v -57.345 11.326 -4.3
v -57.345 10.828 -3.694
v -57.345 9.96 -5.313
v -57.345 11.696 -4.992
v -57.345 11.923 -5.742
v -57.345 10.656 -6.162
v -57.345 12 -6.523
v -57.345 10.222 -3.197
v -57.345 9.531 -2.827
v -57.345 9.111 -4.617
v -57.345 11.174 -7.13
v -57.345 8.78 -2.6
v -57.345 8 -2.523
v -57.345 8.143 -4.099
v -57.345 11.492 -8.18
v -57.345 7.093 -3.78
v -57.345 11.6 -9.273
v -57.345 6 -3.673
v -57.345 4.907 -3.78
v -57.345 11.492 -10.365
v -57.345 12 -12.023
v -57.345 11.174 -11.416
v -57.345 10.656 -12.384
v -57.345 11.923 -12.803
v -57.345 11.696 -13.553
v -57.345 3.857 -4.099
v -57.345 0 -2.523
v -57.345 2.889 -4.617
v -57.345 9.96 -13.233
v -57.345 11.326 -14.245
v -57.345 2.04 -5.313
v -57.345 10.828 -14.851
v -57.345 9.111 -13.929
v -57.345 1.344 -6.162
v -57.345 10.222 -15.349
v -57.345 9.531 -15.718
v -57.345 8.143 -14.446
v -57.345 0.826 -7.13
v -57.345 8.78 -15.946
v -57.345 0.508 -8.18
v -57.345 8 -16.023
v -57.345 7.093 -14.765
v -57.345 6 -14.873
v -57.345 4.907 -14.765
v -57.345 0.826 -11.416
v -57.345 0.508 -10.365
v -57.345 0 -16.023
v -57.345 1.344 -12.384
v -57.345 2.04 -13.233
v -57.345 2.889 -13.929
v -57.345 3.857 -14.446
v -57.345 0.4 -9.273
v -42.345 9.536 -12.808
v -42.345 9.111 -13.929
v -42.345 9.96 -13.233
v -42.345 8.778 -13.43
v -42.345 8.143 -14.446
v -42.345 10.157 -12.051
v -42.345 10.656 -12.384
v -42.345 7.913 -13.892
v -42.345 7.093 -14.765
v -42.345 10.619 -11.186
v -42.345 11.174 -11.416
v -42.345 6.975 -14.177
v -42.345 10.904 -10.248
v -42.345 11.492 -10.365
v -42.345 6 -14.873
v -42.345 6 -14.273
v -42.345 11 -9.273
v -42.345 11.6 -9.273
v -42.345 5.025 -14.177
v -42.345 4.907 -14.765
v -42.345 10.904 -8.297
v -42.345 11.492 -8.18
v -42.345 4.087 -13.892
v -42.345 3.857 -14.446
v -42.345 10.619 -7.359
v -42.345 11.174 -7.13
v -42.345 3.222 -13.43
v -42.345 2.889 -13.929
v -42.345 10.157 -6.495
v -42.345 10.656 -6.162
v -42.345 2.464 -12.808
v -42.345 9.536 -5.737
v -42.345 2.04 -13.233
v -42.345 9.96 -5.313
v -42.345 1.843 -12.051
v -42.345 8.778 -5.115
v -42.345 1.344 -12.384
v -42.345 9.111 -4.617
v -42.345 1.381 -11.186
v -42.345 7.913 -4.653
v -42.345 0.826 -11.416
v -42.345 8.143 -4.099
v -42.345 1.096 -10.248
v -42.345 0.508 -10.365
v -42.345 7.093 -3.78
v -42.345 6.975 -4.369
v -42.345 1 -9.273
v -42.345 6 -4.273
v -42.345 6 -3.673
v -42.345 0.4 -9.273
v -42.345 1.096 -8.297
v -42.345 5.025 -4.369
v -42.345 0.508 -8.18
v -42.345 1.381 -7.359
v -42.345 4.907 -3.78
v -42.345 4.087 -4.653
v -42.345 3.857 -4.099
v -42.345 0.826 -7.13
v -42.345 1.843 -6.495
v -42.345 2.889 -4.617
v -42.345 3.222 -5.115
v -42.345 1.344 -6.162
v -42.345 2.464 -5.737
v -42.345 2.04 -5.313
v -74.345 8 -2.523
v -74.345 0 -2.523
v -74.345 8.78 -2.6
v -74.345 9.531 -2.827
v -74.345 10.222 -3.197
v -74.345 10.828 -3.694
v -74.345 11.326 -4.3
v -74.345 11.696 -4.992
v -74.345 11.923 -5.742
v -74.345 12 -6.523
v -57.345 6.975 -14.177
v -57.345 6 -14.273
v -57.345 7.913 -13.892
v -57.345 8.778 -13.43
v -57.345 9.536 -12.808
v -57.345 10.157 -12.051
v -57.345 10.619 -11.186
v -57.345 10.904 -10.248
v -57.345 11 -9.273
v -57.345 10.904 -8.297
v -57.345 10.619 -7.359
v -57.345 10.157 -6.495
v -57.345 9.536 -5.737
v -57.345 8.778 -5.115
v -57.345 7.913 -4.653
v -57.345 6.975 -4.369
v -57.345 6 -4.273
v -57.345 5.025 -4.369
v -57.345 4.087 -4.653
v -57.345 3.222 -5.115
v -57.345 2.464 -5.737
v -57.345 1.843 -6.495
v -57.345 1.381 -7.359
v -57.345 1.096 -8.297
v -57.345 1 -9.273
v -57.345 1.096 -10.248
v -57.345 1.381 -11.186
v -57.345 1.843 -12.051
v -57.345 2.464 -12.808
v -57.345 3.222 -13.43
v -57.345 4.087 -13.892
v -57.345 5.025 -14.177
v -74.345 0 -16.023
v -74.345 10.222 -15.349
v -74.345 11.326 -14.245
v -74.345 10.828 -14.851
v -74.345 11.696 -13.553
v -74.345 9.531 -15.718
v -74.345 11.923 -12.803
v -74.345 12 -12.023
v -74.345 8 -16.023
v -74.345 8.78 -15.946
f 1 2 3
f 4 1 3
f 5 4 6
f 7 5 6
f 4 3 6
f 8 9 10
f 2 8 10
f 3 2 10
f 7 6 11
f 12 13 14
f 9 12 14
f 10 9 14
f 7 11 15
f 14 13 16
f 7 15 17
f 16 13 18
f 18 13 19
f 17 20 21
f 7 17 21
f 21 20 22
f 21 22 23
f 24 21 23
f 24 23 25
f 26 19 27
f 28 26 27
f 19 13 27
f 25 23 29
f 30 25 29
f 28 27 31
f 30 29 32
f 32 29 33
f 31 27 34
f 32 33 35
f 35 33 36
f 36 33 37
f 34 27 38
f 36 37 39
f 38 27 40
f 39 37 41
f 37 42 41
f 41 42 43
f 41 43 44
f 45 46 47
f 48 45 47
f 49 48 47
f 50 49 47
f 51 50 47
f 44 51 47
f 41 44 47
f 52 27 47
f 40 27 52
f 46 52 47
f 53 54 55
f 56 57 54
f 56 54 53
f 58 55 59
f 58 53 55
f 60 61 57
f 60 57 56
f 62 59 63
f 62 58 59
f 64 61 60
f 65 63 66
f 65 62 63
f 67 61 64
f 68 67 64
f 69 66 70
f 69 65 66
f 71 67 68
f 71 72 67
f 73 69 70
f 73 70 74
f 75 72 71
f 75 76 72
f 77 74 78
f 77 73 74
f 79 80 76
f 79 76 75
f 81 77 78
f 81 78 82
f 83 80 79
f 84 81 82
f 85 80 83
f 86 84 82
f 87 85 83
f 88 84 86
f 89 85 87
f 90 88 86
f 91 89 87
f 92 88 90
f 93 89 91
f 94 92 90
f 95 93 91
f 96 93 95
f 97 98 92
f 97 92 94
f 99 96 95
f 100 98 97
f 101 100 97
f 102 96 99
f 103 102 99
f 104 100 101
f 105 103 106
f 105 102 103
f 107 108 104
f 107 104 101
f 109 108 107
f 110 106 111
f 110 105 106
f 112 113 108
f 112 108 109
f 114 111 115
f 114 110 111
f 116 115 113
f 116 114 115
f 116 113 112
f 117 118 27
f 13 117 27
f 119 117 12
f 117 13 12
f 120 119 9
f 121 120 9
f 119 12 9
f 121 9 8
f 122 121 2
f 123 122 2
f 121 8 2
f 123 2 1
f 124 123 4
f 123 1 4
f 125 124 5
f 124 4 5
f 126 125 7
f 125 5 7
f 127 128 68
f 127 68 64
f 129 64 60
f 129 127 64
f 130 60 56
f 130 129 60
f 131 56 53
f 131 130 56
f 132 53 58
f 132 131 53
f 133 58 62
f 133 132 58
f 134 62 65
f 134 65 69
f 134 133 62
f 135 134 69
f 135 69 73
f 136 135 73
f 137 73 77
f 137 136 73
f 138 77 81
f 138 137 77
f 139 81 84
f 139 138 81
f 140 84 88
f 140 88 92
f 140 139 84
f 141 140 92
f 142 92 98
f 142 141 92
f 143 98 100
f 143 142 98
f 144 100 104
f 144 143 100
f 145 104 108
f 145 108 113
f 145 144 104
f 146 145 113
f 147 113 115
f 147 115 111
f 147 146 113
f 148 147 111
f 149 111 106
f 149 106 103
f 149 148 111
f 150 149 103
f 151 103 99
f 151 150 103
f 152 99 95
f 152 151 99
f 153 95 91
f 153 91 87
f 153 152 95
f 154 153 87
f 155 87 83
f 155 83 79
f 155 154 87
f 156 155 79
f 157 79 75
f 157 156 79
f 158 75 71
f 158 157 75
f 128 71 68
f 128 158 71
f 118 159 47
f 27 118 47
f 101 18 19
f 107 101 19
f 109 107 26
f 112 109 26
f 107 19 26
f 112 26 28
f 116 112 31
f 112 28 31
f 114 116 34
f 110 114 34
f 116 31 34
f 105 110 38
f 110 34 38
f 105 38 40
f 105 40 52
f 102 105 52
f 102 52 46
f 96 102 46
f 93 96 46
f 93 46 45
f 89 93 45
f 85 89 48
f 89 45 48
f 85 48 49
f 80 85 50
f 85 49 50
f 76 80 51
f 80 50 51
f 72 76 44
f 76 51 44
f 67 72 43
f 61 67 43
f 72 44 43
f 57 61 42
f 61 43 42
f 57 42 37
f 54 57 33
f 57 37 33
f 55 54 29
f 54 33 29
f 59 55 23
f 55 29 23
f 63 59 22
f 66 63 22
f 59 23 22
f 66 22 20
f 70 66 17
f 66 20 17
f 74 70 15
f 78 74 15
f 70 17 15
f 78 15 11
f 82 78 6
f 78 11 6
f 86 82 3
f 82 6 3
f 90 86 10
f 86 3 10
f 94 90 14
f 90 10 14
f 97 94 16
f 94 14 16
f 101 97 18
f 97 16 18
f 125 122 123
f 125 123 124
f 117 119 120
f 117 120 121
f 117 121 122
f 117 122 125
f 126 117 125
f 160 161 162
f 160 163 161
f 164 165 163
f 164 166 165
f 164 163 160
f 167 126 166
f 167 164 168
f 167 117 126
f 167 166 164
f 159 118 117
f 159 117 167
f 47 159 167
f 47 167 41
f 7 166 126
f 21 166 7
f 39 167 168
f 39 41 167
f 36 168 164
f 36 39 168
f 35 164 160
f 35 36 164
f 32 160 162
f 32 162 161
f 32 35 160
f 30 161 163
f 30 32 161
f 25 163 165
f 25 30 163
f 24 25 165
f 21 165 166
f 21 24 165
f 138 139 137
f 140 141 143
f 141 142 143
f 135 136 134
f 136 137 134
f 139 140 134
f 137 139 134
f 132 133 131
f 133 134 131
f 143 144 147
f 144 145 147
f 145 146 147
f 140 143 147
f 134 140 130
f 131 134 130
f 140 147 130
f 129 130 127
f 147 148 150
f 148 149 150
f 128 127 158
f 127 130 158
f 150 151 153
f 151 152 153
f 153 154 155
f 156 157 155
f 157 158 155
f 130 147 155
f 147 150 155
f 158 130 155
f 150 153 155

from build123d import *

# Parameters (mm, degrees)
SKETCH1_W           = 17
SKETCH1_H           = 13.5
BOSS_EXTRUDE1_DEPTH = 12
SKETCH2_R           = 5.6
SKETCH2_R_2         = 5
BOSS_EXTRUDE2_DEPTH = 15
FILLET1_R           = 4


with BuildPart() as part:
    # Sketch1 → Boss-Extrude1 (new body)
    with BuildSketch(Plane(origin=(0, 0, 0), x_dir=(1, 0, 0), z_dir=(0, 1, 0))):
        with Locations((-65.845078181, 9.272756488)):
            Rectangle(SKETCH1_W, SKETCH1_H)
    extrude(amount=BOSS_EXTRUDE1_DEPTH)

    # Sketch2 → Boss-Extrude2 (add)
    with BuildSketch(Plane(origin=(-57.345078181, 0, 0), x_dir=(0, 0, -1), z_dir=(1, 0, 0))):
        with Locations(Location((9.272756488, 6, 0), (0, 0, 180))):
            Circle(SKETCH2_R)
        with Locations((9.272756488, 6)):
            Circle(SKETCH2_R_2, mode=Mode.SUBTRACT)
    extrude(amount=BOSS_EXTRUDE2_DEPTH)

    # Fillet1
    fillet1_edges = [part.edges().sort_by_distance(p)[0] for p in [
        (-65.845078181, 12, -16.022756488),
        (-65.845078181, 12, -2.522756488),
    ]]
    fillet(fillet1_edges, radius=FILLET1_R)


solid = part.part
